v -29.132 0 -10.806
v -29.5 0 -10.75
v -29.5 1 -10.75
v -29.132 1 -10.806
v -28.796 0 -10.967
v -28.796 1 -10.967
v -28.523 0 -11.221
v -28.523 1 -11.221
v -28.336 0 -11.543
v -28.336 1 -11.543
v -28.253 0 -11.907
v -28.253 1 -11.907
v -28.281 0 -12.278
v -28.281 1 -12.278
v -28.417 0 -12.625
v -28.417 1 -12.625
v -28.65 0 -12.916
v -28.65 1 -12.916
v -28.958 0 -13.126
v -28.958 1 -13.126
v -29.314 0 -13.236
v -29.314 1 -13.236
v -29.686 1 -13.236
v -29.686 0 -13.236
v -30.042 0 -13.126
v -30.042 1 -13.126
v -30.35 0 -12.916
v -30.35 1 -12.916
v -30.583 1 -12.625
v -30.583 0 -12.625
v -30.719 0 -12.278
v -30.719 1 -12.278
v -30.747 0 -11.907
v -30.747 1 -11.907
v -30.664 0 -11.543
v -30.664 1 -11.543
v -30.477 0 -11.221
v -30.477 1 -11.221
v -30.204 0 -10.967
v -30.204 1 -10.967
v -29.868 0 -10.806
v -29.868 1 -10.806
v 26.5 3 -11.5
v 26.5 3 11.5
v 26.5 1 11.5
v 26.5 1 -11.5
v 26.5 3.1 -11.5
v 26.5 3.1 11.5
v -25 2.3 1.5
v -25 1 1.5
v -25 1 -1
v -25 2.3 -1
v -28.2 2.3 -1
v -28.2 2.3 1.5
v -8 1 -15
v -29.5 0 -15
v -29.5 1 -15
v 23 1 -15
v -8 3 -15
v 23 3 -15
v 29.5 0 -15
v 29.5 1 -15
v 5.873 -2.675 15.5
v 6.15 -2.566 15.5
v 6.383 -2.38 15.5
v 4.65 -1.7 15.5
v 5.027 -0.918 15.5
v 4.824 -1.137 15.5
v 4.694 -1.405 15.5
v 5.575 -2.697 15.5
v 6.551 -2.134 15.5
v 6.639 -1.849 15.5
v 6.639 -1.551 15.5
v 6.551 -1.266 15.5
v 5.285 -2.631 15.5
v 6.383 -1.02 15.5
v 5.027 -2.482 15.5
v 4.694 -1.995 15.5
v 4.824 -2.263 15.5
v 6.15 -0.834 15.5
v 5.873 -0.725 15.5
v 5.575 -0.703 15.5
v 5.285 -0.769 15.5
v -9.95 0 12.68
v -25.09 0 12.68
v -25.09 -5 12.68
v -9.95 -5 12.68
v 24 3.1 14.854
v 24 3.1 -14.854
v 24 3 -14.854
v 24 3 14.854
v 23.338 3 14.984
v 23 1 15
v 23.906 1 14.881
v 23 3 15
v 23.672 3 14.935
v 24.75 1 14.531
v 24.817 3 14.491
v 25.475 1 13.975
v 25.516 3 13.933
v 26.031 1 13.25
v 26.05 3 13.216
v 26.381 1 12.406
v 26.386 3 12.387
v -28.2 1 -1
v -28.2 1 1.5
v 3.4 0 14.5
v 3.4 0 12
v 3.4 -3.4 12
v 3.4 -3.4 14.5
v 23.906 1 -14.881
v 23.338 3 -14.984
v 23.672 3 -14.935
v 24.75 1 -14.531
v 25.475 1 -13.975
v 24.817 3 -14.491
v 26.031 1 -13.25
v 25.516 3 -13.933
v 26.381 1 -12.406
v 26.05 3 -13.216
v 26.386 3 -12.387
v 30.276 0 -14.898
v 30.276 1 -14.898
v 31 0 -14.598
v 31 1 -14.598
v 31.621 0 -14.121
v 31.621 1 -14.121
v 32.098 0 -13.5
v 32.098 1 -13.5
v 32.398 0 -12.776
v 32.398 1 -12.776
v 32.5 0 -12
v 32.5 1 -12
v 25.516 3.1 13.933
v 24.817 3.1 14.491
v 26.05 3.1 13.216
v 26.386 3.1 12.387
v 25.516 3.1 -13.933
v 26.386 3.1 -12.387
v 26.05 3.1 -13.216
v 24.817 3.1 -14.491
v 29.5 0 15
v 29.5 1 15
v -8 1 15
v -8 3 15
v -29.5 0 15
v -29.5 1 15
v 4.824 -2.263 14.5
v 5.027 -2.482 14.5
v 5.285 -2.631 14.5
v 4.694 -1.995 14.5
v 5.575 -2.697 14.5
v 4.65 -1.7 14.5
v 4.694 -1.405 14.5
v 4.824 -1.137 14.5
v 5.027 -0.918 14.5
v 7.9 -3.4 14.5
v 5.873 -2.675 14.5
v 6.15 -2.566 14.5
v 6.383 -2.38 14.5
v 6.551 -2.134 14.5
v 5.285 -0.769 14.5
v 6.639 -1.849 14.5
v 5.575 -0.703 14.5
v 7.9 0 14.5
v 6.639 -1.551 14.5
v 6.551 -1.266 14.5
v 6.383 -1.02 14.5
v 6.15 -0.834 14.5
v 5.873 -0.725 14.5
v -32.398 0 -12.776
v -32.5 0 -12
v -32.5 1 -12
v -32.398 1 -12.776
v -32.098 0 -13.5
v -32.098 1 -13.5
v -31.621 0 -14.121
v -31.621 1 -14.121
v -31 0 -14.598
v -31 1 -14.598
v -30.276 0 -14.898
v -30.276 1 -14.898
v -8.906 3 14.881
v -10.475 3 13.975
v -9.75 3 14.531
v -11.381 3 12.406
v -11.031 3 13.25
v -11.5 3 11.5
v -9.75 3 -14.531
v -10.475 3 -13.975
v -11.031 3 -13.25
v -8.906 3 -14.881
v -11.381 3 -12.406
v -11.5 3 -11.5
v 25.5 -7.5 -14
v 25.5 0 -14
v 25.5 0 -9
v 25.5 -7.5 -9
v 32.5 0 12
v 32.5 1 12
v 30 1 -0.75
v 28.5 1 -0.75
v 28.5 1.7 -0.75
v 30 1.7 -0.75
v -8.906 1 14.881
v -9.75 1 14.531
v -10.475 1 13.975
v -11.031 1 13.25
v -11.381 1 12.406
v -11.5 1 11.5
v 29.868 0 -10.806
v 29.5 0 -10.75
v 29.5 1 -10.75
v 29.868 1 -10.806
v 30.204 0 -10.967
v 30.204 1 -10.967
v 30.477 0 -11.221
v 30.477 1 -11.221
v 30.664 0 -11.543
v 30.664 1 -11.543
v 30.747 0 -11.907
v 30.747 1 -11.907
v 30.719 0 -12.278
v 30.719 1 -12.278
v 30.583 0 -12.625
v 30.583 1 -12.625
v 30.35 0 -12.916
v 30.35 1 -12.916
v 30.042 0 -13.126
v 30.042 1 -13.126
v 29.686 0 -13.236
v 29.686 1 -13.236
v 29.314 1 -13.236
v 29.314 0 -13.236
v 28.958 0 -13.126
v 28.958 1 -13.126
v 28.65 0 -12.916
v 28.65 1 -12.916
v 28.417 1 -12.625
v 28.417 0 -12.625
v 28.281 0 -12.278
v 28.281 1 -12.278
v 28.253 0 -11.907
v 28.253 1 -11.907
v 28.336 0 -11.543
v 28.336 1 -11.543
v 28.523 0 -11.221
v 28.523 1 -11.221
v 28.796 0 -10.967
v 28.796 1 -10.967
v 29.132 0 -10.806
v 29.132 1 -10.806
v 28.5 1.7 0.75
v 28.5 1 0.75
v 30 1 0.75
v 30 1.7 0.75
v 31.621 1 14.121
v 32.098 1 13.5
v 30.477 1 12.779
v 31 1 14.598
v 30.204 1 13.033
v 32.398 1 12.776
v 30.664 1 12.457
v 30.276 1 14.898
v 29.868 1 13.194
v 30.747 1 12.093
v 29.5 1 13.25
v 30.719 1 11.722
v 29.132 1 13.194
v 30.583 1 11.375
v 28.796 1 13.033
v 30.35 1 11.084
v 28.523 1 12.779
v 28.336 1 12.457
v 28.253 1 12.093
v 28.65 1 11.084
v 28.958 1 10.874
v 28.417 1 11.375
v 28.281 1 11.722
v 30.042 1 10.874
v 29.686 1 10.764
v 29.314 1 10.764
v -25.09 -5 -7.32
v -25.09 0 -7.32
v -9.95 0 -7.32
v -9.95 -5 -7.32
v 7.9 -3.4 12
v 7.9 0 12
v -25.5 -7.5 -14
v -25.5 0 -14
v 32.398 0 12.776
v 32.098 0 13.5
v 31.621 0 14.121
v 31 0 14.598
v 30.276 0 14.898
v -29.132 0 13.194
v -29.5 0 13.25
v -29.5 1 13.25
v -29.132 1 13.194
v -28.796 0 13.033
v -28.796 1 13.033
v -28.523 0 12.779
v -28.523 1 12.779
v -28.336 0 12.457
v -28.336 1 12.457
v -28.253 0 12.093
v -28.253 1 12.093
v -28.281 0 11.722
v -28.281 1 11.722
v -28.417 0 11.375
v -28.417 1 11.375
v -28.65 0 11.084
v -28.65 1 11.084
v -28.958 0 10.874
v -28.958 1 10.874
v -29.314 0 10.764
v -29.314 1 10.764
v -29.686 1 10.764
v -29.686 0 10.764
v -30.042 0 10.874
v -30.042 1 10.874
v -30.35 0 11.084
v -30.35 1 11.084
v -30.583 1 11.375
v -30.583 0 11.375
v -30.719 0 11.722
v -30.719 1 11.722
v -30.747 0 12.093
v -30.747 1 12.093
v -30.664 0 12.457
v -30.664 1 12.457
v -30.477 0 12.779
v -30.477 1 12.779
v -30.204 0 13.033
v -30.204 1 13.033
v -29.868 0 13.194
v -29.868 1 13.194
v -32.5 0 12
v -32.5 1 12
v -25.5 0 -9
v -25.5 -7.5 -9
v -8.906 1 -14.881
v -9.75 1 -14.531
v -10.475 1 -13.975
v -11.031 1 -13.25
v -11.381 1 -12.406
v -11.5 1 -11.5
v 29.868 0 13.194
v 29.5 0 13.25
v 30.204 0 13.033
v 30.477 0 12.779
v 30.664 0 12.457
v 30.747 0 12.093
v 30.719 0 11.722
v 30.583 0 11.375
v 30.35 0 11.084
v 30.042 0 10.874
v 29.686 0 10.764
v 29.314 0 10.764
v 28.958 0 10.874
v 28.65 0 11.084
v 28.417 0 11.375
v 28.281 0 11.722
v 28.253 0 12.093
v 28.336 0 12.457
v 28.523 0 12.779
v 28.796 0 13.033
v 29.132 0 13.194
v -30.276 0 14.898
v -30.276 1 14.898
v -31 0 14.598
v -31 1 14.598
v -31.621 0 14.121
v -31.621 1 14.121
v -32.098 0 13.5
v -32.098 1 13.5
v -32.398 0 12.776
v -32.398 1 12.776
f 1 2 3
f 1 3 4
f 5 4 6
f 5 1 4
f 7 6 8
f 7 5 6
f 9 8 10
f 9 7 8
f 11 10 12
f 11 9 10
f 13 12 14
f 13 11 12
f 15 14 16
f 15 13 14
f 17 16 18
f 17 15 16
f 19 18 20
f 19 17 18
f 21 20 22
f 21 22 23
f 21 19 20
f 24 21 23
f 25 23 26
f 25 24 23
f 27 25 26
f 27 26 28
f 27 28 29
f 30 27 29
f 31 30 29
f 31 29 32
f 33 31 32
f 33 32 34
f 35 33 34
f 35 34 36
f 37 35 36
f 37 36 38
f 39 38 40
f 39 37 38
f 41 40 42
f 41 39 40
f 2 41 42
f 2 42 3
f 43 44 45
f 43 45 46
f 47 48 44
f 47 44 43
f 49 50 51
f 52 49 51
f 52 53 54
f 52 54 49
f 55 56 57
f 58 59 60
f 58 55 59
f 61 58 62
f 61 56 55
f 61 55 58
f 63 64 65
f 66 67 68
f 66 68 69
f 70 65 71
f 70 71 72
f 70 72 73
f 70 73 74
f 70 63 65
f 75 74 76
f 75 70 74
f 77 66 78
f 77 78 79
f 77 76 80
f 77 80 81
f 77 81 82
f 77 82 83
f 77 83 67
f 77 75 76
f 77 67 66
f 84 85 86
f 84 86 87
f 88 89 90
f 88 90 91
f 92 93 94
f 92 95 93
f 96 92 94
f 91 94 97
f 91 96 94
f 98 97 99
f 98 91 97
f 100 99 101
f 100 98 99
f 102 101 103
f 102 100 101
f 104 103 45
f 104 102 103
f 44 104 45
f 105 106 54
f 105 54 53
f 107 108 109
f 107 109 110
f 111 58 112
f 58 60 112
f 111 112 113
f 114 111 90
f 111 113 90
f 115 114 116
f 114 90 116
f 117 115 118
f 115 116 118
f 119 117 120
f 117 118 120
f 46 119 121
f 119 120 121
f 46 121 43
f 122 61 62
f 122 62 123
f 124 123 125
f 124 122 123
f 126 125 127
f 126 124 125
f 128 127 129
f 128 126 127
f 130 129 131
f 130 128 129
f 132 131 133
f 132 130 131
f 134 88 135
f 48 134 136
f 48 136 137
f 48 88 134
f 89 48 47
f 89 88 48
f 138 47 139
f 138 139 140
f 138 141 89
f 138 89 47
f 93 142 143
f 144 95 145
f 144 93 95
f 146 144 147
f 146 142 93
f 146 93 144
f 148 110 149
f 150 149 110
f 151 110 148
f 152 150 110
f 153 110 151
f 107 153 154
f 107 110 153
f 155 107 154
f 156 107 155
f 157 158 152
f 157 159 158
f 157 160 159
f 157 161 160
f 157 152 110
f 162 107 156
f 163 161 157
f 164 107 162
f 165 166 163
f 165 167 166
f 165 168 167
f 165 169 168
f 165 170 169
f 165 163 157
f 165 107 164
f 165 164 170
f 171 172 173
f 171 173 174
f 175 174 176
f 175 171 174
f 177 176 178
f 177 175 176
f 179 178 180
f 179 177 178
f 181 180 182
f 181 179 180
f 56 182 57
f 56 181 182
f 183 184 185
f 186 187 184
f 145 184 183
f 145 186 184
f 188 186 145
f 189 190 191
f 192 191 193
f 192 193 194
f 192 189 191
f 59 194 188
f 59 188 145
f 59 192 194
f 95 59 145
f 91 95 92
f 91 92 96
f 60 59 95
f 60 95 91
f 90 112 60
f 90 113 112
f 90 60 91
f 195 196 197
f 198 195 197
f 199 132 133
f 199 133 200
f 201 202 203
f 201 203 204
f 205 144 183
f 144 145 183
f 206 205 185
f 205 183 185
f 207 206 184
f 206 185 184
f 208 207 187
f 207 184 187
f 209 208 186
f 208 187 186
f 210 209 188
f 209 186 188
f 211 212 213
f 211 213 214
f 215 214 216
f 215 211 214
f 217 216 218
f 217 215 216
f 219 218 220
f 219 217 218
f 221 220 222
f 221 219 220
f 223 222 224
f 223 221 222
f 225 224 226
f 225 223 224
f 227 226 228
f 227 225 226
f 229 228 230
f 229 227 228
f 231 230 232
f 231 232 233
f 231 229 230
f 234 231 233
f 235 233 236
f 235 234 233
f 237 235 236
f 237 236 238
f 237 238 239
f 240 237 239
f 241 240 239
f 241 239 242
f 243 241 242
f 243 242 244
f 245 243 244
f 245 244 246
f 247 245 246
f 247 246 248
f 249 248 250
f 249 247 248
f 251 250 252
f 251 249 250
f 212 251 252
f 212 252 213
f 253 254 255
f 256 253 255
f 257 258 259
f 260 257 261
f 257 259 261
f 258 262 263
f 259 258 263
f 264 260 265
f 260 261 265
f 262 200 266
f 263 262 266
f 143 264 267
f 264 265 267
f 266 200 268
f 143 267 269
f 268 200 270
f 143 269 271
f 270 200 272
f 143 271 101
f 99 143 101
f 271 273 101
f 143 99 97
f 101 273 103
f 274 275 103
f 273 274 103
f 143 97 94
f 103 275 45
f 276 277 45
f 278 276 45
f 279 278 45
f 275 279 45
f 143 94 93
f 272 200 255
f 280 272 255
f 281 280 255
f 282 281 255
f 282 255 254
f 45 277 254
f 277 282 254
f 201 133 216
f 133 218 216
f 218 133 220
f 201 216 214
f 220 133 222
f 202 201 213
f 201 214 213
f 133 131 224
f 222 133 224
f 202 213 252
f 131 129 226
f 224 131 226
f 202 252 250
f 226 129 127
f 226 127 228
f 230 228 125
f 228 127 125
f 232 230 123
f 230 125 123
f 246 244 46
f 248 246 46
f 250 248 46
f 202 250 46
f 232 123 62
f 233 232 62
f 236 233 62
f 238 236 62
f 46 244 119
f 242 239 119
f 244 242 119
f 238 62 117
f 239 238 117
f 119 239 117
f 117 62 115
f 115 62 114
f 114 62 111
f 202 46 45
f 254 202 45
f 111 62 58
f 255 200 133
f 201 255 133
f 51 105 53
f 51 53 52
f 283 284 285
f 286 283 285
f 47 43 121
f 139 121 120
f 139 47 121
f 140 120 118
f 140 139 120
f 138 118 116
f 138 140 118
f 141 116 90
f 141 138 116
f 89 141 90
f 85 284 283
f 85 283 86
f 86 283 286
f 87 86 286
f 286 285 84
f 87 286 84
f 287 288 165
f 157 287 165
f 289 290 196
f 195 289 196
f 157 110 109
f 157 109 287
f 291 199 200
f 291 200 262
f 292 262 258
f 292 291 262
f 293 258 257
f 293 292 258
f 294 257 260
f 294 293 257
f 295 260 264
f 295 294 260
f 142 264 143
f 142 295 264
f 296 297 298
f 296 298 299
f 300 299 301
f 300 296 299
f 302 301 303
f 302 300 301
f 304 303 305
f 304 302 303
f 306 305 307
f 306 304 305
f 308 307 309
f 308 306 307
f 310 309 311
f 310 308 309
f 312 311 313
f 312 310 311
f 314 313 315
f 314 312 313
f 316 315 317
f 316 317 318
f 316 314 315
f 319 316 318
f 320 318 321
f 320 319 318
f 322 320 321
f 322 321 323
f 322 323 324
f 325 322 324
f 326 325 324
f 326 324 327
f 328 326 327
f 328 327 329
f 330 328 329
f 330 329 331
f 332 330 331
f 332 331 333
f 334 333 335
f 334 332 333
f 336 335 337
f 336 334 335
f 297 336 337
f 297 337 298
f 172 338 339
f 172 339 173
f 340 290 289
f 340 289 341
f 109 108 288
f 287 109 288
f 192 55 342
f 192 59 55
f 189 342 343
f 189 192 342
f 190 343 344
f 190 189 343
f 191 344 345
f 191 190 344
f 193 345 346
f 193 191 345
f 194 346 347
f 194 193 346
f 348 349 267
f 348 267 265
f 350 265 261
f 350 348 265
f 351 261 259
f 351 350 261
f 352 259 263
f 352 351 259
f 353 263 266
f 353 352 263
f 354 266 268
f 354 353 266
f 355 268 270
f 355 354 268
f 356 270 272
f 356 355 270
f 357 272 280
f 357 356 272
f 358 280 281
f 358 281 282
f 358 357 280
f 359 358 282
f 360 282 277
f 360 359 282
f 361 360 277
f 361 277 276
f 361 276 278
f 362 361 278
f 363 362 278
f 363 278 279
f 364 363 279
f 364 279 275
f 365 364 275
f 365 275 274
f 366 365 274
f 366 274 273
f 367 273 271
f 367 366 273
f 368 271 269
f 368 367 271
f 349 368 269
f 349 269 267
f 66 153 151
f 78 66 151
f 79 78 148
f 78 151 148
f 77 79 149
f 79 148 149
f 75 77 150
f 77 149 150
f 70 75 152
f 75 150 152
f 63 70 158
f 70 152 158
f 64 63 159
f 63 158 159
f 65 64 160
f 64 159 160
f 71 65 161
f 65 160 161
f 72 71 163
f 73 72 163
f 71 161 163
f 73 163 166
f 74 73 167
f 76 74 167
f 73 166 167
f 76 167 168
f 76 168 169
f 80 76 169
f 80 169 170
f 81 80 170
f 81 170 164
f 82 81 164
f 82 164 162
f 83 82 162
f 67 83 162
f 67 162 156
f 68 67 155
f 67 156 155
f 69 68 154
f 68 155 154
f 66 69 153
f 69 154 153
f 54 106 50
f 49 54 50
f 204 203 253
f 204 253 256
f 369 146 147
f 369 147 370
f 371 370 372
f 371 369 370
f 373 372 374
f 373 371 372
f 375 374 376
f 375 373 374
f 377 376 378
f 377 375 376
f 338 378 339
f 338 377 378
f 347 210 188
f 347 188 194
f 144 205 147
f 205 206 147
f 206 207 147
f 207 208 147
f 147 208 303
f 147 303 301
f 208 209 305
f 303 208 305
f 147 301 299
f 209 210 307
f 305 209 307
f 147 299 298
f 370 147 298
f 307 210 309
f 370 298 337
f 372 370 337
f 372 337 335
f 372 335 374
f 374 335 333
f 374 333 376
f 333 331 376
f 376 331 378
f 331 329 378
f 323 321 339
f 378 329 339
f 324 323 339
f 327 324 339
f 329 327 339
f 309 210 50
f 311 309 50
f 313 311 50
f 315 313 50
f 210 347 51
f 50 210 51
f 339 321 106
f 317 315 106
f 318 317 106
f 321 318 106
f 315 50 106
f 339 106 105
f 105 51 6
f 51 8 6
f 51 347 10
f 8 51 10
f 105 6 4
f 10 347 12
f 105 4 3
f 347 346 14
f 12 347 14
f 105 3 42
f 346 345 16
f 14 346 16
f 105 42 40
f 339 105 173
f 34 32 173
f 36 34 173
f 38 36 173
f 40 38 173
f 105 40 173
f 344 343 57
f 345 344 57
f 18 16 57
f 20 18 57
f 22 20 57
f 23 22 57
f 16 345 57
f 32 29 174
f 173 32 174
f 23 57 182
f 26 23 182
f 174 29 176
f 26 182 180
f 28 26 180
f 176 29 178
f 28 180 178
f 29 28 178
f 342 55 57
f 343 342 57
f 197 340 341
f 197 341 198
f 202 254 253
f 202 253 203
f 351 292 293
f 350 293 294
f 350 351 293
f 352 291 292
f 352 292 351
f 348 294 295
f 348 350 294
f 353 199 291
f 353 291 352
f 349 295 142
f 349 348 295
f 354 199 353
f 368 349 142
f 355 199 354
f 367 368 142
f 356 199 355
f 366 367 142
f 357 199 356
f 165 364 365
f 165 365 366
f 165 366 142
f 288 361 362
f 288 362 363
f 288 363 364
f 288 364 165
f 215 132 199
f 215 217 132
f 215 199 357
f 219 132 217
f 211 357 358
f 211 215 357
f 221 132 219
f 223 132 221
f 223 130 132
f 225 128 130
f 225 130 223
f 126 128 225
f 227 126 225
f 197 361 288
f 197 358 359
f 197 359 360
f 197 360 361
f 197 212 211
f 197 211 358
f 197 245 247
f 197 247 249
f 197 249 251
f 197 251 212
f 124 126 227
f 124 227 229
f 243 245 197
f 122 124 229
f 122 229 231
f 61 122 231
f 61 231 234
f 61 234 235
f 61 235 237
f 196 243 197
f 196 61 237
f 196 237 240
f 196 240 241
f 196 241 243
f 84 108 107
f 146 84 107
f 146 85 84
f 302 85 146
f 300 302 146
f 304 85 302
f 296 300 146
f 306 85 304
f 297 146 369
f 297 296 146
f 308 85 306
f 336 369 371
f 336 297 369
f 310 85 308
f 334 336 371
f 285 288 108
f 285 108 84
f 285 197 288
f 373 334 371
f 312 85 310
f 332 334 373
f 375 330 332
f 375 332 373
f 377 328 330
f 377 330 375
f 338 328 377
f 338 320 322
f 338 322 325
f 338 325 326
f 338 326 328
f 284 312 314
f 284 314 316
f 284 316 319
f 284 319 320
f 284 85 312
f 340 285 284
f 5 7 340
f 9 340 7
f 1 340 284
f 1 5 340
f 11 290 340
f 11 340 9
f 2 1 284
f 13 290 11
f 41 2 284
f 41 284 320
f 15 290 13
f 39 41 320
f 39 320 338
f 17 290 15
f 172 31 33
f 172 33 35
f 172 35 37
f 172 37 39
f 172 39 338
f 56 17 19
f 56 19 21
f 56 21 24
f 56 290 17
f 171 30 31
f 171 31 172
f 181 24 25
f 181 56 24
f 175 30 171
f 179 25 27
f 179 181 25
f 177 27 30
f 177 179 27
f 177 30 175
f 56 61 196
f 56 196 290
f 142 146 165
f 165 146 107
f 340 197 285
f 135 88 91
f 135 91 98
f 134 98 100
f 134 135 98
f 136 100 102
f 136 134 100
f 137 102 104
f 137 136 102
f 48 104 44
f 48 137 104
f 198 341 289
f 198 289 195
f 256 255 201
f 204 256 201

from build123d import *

# Parameters (mm, degrees)
SKETCH_1_R       = 1.25
BOARD_DEPTH      = 1
SKETCH_2_W       = 38
SKETCH_2_H       = 30
SCREEN_DEPTH     = 2
SCREEN_RADIUS_R  = 3.5
SKETCH_3_W       = 51
SKETCH_3_H       = 5
PLUG_DEPTH       = 7.5
SKETCH_4_W       = 15.14
SKETCH_4_H       = 20
SPEAKER_DEPTH    = 5
SKETCH_5_W       = 4.5
SKETCH_5_H       = 2.5
BUTTON_DEPTH     = 3.4
SKETCH_6_R       = 1
BUTTON_TAP_DEPTH = 1
SKETCH_7_W       = 1.5
SKETCH_7_H       = 1.5
RGB_LED_DEPTH    = 0.7
SKETCH_8_W       = 3.2
SKETCH_8_H       = 2.5
MIC_DEPTH        = 1.3
EXTRUDE_START    = 0.1
EXTRUDE_1_DEPTH  = 0.1


with BuildPart() as part:
    # 草图1 → board (new body)
    with BuildSketch(Plane(origin=(0, 0, 0), x_dir=(1, 0, 0), z_dir=(0, 1, 0))):
        with BuildLine():
            Line((-29.5, 15), (29.5, 15))
            ThreePointArc((29.5, 15), (31.621320344, 14.121320344), (32.5, 12))
            Line((32.5, 12), (32.5, -12))
            ThreePointArc((32.5, -12), (31.621320344, -14.121320344), (29.5, -15))
            Line((29.5, -15), (-29.5, -15))
            ThreePointArc((-29.5, -15), (-31.621320344, -14.121320344), (-32.5, -12))
            Line((-32.5, -12), (-32.5, 12))
            ThreePointArc((-32.5, 12), (-31.621320344, 14.121320344), (-29.5, 15))
        make_face()
        with Locations(Location((-29.5, 12, 0), (0, 0, 270))):
            Circle(SKETCH_1_R, mode=Mode.SUBTRACT)
        with Locations(Location((29.5, 12, 0), (0, 0, 270))):
            Circle(SKETCH_1_R, mode=Mode.SUBTRACT)
        with Locations(Location((-29.5, -12, 0), (0, 0, 270))):
            Circle(SKETCH_1_R, mode=Mode.SUBTRACT)
        with Locations(Location((29.5, -12, 0), (0, 0, 270))):
            Circle(SKETCH_1_R, mode=Mode.SUBTRACT)
    extrude(amount=BOARD_DEPTH)

    # 草图2 → screen (add)
    with BuildSketch(Plane(origin=(0, 1, 0), x_dir=(1, 0, 0), z_dir=(0, 1, 0))):
        with Locations((7.5, 0)):
            Rectangle(SKETCH_2_W, SKETCH_2_H)
    extrude(amount=SCREEN_DEPTH)

    # screen-radius
    screen_radius_edges = [part.edges().sort_by_distance(p)[0] for p in [
        (-11.5, 2, -15),
        (-11.5, 2, 15),
        (26.5, 2, 15),
        (26.5, 2, -15),
    ]]
    fillet(screen_radius_edges, radius=SCREEN_RADIUS_R)

    # 草图3 → plug (add)
    with BuildSketch(Plane.XZ):
        with Locations((0, -11.5)):
            Rectangle(SKETCH_3_W, SKETCH_3_H)
    extrude(amount=PLUG_DEPTH)

    # 草图4 → speaker (add)
    with BuildSketch(Plane.XZ):
        with Locations((-17.52, 2.68)):
            Rectangle(SKETCH_4_W, SKETCH_4_H)
    extrude(amount=SPEAKER_DEPTH)

    # 草图5 → button (add)
    with BuildSketch(Plane.XZ):
        with Locations((5.65, 13.25)):
            Rectangle(SKETCH_5_W, SKETCH_5_H)
    extrude(amount=BUTTON_DEPTH)

    # 草图6 → button-tap (add)
    with BuildSketch(Plane.XY.offset(14.5)):
        with Locations(Location((5.65, -1.7, 0), (0, 0, 180))):
            Circle(SKETCH_6_R)
    extrude(amount=BUTTON_TAP_DEPTH)

    # 草图7 → rgb-led (add)
    with BuildSketch(Plane(origin=(0, 1, 0), x_dir=(1, 0, 0), z_dir=(0, 1, 0))):
        with Locations((29.25, 0)):
            Rectangle(SKETCH_7_W, SKETCH_7_H)
    extrude(amount=RGB_LED_DEPTH)

    # 草图8 → mic (add)
    with BuildSketch(Plane(origin=(0, 1, 0), x_dir=(1, 0, 0), z_dir=(0, 1, 0))):
        with Locations((-26.6, -0.25)):
            Rectangle(SKETCH_8_W, SKETCH_8_H)
    extrude(amount=MIC_DEPTH)

    # 草图9 → 凸台-拉伸1 (add)
    with BuildSketch(Plane(origin=(0, 3, 0), x_dir=(1, 0, 0), z_dir=(0, 1, 0)).offset(EXTRUDE_START)):
        with BuildLine():
            Line((26.5, -11.5), (26.5, 11.5))
            ThreePointArc((26.5, 11.5), (25.80624304, 13.591650066), (24, 14.854101966))
            Line((24, 14.854101966), (24, -14.854101966))
            ThreePointArc((24, -14.854101966), (25.80624304, -13.591650066), (26.5, -11.5))
        make_face()
    extrude(amount=-EXTRUDE_1_DEPTH)


solid = part.part
